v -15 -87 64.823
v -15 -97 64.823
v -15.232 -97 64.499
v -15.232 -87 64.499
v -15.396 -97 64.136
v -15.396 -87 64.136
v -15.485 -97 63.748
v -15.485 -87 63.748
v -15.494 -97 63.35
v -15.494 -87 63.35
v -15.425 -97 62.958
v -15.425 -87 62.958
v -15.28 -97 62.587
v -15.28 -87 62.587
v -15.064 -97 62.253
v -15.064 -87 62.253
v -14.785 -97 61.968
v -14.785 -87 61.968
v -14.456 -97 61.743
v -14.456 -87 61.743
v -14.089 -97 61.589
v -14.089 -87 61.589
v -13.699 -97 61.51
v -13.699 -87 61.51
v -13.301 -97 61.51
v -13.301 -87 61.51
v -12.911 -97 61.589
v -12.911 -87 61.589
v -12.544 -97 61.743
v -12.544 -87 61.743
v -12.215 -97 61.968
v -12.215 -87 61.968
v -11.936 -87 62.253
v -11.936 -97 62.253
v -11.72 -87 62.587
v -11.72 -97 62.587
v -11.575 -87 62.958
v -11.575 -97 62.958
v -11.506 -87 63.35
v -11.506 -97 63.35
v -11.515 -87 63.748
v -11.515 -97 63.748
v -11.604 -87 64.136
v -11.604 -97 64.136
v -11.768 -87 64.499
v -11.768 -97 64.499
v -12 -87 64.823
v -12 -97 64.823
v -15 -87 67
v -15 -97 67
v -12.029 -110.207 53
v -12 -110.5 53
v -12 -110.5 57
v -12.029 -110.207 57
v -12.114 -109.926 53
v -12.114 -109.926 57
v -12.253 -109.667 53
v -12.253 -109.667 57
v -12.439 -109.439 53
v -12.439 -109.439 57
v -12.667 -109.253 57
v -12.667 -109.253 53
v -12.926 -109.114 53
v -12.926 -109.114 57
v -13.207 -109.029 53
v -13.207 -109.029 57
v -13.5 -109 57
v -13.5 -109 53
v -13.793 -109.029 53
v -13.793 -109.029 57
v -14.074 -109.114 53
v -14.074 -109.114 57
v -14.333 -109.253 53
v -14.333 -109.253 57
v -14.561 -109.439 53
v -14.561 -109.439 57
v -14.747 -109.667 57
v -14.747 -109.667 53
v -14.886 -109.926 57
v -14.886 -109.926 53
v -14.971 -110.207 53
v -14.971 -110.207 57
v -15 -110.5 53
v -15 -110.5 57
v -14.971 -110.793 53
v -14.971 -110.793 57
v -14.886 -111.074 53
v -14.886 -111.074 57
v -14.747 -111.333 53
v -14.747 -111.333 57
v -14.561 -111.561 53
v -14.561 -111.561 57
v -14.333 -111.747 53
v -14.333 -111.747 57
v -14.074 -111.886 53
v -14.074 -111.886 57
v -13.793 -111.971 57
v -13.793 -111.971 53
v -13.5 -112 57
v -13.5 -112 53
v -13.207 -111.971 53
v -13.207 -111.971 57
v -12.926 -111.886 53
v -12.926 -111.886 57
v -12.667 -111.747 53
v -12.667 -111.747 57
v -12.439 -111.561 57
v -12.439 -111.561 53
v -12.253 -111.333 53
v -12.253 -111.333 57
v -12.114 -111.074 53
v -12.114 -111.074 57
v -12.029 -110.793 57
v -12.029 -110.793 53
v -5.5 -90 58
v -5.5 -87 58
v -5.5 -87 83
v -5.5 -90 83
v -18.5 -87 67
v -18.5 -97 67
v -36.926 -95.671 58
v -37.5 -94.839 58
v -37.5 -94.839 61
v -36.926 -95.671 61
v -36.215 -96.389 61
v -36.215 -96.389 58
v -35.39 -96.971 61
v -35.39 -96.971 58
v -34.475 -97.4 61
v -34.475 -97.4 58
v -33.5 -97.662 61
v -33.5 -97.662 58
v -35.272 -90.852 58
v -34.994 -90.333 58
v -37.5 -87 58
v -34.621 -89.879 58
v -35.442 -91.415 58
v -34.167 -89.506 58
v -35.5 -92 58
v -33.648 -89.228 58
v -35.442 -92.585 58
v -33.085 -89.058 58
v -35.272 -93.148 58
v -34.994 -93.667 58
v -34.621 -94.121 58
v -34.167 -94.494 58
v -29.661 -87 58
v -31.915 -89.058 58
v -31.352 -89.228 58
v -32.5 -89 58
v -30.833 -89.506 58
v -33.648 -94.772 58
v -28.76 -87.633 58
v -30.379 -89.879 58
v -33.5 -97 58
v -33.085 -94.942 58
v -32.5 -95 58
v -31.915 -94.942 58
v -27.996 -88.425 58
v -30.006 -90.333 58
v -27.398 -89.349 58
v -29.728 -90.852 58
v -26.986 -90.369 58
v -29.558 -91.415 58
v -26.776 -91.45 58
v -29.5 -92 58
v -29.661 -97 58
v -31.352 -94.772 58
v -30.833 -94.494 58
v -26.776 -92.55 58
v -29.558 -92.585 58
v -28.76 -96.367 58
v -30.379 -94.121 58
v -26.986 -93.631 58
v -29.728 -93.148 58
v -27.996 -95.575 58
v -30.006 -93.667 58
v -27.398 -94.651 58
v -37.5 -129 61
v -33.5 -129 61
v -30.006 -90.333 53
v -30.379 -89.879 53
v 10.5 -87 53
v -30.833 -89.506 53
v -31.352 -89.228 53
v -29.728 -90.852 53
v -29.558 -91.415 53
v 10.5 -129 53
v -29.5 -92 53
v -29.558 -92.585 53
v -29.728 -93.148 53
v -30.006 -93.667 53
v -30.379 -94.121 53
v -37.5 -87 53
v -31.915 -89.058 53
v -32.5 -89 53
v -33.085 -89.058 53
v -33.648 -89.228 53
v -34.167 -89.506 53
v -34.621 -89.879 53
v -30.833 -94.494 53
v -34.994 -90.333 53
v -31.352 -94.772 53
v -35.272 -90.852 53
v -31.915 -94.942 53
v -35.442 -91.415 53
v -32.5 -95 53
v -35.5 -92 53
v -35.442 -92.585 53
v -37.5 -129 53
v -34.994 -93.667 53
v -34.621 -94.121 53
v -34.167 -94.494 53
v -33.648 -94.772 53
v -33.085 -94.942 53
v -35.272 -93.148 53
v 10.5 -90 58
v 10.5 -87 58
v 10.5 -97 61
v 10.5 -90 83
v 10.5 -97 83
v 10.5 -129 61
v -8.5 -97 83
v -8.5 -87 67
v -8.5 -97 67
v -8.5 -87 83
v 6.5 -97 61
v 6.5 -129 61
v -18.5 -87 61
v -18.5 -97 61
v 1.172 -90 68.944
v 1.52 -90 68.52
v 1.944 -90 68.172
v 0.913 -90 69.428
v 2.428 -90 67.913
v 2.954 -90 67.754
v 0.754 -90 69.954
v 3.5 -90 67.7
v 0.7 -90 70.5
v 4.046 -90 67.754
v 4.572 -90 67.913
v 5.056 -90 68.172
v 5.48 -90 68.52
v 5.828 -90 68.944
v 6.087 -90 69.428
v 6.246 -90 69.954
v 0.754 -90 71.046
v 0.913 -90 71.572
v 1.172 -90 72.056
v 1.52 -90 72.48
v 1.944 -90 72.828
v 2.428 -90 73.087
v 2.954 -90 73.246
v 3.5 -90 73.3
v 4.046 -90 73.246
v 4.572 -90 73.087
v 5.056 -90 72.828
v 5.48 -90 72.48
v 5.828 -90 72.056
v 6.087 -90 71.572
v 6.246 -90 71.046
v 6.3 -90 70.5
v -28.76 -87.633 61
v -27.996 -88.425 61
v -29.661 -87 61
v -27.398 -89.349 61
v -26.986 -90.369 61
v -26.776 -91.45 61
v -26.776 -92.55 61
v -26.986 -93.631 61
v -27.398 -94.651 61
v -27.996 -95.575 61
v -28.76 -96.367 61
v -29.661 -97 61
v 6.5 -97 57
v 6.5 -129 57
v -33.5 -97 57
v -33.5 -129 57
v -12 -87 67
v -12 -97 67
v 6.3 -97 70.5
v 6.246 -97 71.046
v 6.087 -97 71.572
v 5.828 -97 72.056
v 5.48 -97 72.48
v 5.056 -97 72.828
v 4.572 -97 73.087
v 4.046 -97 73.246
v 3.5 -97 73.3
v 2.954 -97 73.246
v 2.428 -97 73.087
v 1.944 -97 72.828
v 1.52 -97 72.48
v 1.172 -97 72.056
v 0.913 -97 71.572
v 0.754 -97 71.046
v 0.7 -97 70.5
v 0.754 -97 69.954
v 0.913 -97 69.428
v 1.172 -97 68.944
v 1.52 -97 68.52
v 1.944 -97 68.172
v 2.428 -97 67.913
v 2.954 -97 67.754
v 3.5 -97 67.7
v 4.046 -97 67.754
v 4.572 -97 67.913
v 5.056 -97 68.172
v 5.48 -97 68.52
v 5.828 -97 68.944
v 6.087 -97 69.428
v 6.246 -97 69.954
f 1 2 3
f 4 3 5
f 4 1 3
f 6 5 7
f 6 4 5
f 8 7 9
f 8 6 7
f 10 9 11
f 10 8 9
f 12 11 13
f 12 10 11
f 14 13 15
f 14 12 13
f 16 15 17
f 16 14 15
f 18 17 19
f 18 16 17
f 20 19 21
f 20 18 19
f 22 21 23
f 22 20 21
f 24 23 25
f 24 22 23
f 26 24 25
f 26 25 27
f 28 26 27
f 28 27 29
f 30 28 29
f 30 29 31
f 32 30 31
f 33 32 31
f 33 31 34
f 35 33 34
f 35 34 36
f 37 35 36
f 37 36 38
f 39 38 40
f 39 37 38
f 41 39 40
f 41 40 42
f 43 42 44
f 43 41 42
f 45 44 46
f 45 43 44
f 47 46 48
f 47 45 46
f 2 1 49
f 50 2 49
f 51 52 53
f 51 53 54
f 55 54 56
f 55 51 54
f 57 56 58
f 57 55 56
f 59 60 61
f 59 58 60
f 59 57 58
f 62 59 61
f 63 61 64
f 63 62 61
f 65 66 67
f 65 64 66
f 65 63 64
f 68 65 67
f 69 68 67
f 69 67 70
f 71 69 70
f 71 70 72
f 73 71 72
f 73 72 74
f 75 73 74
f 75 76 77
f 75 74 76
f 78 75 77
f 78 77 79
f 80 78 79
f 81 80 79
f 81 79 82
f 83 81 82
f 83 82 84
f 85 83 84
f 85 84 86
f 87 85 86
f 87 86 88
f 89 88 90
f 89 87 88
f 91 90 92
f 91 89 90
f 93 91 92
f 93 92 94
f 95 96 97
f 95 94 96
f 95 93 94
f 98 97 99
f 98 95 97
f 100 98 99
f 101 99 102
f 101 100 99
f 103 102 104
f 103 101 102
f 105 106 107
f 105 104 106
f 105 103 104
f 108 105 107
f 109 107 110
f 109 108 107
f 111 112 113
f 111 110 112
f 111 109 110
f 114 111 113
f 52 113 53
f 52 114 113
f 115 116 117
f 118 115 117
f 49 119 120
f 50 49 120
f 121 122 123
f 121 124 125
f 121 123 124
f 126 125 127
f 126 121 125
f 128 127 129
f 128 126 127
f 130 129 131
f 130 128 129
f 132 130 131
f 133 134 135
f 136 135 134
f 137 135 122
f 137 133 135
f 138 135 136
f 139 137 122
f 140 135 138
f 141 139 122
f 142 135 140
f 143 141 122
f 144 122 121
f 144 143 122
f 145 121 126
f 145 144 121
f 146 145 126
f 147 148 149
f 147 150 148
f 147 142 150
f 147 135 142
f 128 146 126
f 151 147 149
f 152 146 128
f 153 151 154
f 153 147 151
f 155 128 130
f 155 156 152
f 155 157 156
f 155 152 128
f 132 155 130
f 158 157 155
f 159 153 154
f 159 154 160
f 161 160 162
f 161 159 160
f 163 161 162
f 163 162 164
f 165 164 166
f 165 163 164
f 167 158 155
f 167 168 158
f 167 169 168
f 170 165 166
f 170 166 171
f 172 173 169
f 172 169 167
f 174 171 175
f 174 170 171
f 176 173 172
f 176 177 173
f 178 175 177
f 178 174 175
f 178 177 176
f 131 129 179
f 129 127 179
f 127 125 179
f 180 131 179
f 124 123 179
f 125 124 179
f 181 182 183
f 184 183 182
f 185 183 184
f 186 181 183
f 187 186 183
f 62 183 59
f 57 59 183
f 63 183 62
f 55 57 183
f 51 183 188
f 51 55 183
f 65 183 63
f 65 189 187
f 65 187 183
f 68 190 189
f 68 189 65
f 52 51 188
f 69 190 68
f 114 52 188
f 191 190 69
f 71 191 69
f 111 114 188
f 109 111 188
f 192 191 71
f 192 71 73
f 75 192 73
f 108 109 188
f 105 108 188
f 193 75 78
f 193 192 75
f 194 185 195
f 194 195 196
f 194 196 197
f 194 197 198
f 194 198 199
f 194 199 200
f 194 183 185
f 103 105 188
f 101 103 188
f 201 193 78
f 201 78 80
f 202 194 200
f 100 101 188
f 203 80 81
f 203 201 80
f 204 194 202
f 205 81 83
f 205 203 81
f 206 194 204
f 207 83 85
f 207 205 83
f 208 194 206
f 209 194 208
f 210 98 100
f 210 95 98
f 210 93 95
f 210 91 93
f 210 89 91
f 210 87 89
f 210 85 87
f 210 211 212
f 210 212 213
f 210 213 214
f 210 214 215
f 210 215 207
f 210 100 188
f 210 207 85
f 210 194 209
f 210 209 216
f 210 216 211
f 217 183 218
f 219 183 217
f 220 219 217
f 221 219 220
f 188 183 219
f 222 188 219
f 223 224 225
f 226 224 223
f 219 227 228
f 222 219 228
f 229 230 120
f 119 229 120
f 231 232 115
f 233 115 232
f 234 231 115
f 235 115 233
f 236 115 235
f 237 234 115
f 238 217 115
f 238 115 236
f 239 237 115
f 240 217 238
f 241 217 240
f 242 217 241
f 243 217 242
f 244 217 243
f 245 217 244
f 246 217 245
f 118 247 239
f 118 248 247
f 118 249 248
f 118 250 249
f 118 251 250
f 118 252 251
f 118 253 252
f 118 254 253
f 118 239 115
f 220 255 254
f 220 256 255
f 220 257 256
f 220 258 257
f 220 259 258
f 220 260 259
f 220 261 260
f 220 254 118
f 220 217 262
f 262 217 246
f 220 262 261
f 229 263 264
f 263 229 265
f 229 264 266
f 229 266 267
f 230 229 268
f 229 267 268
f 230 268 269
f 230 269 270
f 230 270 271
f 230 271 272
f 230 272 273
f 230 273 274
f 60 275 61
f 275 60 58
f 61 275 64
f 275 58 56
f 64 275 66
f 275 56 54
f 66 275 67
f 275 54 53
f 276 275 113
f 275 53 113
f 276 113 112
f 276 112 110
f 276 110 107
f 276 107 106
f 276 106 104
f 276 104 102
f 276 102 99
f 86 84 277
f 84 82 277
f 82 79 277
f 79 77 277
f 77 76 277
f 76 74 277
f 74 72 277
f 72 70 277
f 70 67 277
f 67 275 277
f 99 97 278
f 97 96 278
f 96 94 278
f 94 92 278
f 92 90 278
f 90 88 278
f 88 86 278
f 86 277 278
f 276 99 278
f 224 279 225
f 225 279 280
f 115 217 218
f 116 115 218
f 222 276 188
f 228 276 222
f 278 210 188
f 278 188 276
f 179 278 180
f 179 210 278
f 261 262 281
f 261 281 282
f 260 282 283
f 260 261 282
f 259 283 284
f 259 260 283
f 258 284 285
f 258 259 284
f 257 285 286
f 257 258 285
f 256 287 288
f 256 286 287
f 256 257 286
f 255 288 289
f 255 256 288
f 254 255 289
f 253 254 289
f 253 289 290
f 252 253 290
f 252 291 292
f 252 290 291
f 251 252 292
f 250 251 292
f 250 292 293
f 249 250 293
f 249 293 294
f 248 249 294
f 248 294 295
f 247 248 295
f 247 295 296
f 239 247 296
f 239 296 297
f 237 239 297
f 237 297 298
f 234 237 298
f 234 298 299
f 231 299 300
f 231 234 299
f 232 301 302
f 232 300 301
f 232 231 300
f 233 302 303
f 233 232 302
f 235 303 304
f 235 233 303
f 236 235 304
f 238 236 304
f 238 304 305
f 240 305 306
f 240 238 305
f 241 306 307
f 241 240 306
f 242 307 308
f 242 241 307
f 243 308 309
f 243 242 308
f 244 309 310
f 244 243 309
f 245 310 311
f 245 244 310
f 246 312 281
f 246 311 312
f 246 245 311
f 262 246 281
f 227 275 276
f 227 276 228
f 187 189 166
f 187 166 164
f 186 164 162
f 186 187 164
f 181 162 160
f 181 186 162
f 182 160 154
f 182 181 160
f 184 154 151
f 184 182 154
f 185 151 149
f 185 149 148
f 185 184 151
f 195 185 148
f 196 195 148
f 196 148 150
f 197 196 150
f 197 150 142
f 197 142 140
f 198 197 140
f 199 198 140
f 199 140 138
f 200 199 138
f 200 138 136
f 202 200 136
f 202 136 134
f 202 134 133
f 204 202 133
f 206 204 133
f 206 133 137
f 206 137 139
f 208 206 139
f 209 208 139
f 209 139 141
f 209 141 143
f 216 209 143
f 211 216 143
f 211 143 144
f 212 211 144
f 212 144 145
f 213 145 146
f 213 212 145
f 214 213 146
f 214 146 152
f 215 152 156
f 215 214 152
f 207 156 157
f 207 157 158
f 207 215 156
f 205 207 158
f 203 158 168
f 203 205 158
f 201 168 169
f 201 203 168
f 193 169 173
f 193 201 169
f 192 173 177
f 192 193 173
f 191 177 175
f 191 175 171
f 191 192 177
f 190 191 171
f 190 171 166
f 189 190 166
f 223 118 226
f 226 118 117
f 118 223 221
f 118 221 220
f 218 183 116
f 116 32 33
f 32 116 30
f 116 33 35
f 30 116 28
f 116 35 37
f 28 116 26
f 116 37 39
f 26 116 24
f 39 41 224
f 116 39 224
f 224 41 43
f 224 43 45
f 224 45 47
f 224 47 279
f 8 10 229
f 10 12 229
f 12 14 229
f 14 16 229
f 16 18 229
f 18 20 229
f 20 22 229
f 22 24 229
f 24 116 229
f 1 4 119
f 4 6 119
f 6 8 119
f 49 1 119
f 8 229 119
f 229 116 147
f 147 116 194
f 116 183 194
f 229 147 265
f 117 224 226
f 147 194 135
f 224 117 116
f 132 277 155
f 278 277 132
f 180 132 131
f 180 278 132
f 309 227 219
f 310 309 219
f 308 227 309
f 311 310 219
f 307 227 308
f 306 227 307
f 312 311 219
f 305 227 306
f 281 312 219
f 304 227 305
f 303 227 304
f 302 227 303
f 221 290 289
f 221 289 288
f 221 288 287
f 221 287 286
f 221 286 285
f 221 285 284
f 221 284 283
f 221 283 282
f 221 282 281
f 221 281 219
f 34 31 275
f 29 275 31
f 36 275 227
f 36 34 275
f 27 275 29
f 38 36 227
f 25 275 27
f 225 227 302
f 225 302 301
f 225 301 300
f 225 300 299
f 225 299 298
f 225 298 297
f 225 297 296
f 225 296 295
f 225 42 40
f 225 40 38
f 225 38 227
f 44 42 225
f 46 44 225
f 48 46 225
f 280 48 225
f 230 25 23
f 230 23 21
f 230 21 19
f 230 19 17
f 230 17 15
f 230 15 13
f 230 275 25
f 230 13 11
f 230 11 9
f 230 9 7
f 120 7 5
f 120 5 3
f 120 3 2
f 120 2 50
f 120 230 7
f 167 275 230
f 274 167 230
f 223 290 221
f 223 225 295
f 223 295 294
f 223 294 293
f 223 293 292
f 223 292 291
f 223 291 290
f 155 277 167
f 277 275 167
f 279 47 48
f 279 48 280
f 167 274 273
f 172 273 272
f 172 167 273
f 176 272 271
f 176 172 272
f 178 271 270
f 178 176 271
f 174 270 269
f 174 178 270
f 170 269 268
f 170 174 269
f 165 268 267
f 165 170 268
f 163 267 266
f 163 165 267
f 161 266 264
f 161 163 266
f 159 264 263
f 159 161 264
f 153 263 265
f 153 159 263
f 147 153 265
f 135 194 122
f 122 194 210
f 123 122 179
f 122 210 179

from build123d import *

# Parameters (mm, degrees)
CYLINDER015_W               = 7.75
CYLINDER015_H               = 10
CYLINDER015_ANGLE           = 90
CYLINDER014_R               = 5.75
CYLINDER014_DEPTH           = 10
CYLINDER014_PLACEMENT_ANGLE = 285
CYLINDER013_R               = 3
CYLINDER013_DEPTH           = 10
CYLINDER_R                  = 2.8
CYLINDER_DEPTH              = 19
BOX_W                       = 25
BOX_H                       = 10
BOX_DEPTH                   = 16
CYLINDER011_R               = 2
CYLINDER011_DEPTH           = 20
CYLINDER012_R               = 1.5
CYLINDER012_DEPTH           = 42
BOX020_W                    = 18
BOX020_H                    = 50
BOX020_DEPTH                = 40
BOX021_W                    = 9
BOX021_H                    = 32
BOX021_DEPTH                = 3
BOX018_W                    = 8
BOX018_H                    = 42
BOX018_DEPTH                = 48
BOX019_W                    = 10
BOX019_H                    = 10
BOX019_DEPTH                = 10
CUT_PLACEMENT_ANGLE         = 180
BOX022_W                    = 30
BOX022_H                    = 10
BOX022_DEPTH                = 19


with BuildPart() as cylinder015:
    # Cylinder015 → Cylinder015 (revolve)
    with BuildSketch(Plane(origin=(-32.5, -92, 58), x_dir=(0, 1, 0), z_dir=(1, 0, 0))):
        with Locations((3.875, 5)):
            Rectangle(CYLINDER015_W, CYLINDER015_H)
    revolve(axis=Axis((-32.5, -92, 58), (0, 0, 1)), revolution_arc=CYLINDER015_ANGLE)


with BuildPart() as cylinder014:
    # Cylinder014 → Cylinder014 (new body)
    with BuildSketch(Plane.XY):
        Circle(CYLINDER014_R)
    extrude(amount=CYLINDER014_DEPTH)


with BuildPart() as cylinder014_1:
    # Cylinder014 placement: moved
    add(cylinder014.part.moved(Location((-32.5, -92, 58))).rotate(Axis((-32.5, -92, 58), (0, 0, 1)), CYLINDER014_PLACEMENT_ANGLE))


with BuildPart() as cylinder013:
    # Cylinder013 → Cylinder013 (new body)
    with BuildSketch(Plane(origin=(-32.5, -92, 53), x_dir=(1, 0, 0), z_dir=(0, 0, 1))):
        Circle(CYLINDER013_R)
    extrude(amount=CYLINDER013_DEPTH)


with BuildPart() as cylinder:
    # Cylinder → Cylinder (new body)
    with BuildSketch(Plane(origin=(3.5, -80, 70.5), x_dir=(1, 0, 0), z_dir=(0, -1, 0))):
        Circle(CYLINDER_R)
    extrude(amount=CYLINDER_DEPTH)


with BuildPart() as fusion002:
    # Box → Box (new body)
    with BuildSketch(Plane(origin=(10.5, -90, 58), x_dir=(0, 0, 1), z_dir=(-1, 0, 0))):
        with Locations((12.5, 5)):
            Rectangle(BOX_W, BOX_H)
    extrude(amount=BOX_DEPTH)

    # Fusion002: union Cylinder
    add(cylinder.part)


with BuildPart() as cylinder001:
    # Cylinder011 → Cylinder011 (new body)
    with BuildSketch(Plane(origin=(13.5, 87, 63.5), x_dir=(-1, 0, 0), z_dir=(0, 1, 0))):
        Circle(CYLINDER011_R)
    extrude(amount=CYLINDER011_DEPTH)


with BuildPart() as cut001:
    # Cylinder012 → Cylinder012 (new body)
    with BuildSketch(Plane(origin=(13.5, 110.5, 42.5), x_dir=(-1, 0, 0), z_dir=(0, 0, 1))):
        Circle(CYLINDER012_R)
    extrude(amount=CYLINDER012_DEPTH)


with BuildPart() as gpscut:
    # Box020 → Box020 (new body)
    with BuildSketch(Plane(origin=(33.5, 97, 57), x_dir=(0, 0, 1), z_dir=(-1, 0, 0))):
        with Locations((9, 25)):
            Rectangle(BOX020_W, BOX020_H)
    extrude(amount=BOX020_DEPTH)


with BuildPart() as fusion001:
    # Box021 → Box021 (new body)
    with BuildSketch(Plane(origin=(15, 87, 63), x_dir=(0, 0, 1), z_dir=(-1, 0, 0))):
        with Locations((4.5, 16)):
            Rectangle(BOX021_W, BOX021_H)
    extrude(amount=BOX021_DEPTH)

    # Fusion001: union Cylinder001, cut001, gpsCut
    add(cylinder001.part)
    add(cut001.part)
    add(gpscut.part)


with BuildPart() as shell:
    # Box018 → Box018 (new body)
    with BuildSketch(Plane(origin=(37.5, 87, 53), x_dir=(0, 0, 1), z_dir=(-1, 0, 0))):
        with Locations((4, 21)):
            Rectangle(BOX018_W, BOX018_H)
    extrude(amount=BOX018_DEPTH)


with BuildPart() as gpsholer:
    # Box019 → Box019 (new body)
    with BuildSketch(Plane(origin=(18.5, 87, 57), x_dir=(0, 0, 1), z_dir=(-1, 0, 0))):
        with Locations((5, 5)):
            Rectangle(BOX019_W, BOX019_H)
    extrude(amount=BOX019_DEPTH)

    # Fusion: union shell
    add(shell.part)

    # Cut: cut Fusion001
    add(fusion001.part, mode=Mode.SUBTRACT)


with BuildPart() as gpsholer_1:
    # Cut placement: moved
    add(gpsholer.part.rotate(Axis((0, 0, 0), (0, 0, 1)), CUT_PLACEMENT_ANGLE))


with BuildPart() as gpsholder002:
    # Box022 → Box022 (new body)
    with BuildSketch(Plane(origin=(10.5, -97, 53), x_dir=(0, 0, 1), z_dir=(-1, 0, 0))):
        with Locations((15, 5)):
            Rectangle(BOX022_W, BOX022_H)
    extrude(amount=BOX022_DEPTH)

    # Fusion003: union gpsHoler
    add(gpsholer_1.part)

    # Cut001: cut Fusion002
    add(fusion002.part, mode=Mode.SUBTRACT)

    # Cut002: cut Cylinder013
    add(cylinder013.part, mode=Mode.SUBTRACT)

    # Cut003: cut Cylinder014
    add(cylinder014_1.part, mode=Mode.SUBTRACT)

    # Cut004: cut Cylinder015
    add(cylinder015.part, mode=Mode.SUBTRACT)


solid = gpsholder002.part
